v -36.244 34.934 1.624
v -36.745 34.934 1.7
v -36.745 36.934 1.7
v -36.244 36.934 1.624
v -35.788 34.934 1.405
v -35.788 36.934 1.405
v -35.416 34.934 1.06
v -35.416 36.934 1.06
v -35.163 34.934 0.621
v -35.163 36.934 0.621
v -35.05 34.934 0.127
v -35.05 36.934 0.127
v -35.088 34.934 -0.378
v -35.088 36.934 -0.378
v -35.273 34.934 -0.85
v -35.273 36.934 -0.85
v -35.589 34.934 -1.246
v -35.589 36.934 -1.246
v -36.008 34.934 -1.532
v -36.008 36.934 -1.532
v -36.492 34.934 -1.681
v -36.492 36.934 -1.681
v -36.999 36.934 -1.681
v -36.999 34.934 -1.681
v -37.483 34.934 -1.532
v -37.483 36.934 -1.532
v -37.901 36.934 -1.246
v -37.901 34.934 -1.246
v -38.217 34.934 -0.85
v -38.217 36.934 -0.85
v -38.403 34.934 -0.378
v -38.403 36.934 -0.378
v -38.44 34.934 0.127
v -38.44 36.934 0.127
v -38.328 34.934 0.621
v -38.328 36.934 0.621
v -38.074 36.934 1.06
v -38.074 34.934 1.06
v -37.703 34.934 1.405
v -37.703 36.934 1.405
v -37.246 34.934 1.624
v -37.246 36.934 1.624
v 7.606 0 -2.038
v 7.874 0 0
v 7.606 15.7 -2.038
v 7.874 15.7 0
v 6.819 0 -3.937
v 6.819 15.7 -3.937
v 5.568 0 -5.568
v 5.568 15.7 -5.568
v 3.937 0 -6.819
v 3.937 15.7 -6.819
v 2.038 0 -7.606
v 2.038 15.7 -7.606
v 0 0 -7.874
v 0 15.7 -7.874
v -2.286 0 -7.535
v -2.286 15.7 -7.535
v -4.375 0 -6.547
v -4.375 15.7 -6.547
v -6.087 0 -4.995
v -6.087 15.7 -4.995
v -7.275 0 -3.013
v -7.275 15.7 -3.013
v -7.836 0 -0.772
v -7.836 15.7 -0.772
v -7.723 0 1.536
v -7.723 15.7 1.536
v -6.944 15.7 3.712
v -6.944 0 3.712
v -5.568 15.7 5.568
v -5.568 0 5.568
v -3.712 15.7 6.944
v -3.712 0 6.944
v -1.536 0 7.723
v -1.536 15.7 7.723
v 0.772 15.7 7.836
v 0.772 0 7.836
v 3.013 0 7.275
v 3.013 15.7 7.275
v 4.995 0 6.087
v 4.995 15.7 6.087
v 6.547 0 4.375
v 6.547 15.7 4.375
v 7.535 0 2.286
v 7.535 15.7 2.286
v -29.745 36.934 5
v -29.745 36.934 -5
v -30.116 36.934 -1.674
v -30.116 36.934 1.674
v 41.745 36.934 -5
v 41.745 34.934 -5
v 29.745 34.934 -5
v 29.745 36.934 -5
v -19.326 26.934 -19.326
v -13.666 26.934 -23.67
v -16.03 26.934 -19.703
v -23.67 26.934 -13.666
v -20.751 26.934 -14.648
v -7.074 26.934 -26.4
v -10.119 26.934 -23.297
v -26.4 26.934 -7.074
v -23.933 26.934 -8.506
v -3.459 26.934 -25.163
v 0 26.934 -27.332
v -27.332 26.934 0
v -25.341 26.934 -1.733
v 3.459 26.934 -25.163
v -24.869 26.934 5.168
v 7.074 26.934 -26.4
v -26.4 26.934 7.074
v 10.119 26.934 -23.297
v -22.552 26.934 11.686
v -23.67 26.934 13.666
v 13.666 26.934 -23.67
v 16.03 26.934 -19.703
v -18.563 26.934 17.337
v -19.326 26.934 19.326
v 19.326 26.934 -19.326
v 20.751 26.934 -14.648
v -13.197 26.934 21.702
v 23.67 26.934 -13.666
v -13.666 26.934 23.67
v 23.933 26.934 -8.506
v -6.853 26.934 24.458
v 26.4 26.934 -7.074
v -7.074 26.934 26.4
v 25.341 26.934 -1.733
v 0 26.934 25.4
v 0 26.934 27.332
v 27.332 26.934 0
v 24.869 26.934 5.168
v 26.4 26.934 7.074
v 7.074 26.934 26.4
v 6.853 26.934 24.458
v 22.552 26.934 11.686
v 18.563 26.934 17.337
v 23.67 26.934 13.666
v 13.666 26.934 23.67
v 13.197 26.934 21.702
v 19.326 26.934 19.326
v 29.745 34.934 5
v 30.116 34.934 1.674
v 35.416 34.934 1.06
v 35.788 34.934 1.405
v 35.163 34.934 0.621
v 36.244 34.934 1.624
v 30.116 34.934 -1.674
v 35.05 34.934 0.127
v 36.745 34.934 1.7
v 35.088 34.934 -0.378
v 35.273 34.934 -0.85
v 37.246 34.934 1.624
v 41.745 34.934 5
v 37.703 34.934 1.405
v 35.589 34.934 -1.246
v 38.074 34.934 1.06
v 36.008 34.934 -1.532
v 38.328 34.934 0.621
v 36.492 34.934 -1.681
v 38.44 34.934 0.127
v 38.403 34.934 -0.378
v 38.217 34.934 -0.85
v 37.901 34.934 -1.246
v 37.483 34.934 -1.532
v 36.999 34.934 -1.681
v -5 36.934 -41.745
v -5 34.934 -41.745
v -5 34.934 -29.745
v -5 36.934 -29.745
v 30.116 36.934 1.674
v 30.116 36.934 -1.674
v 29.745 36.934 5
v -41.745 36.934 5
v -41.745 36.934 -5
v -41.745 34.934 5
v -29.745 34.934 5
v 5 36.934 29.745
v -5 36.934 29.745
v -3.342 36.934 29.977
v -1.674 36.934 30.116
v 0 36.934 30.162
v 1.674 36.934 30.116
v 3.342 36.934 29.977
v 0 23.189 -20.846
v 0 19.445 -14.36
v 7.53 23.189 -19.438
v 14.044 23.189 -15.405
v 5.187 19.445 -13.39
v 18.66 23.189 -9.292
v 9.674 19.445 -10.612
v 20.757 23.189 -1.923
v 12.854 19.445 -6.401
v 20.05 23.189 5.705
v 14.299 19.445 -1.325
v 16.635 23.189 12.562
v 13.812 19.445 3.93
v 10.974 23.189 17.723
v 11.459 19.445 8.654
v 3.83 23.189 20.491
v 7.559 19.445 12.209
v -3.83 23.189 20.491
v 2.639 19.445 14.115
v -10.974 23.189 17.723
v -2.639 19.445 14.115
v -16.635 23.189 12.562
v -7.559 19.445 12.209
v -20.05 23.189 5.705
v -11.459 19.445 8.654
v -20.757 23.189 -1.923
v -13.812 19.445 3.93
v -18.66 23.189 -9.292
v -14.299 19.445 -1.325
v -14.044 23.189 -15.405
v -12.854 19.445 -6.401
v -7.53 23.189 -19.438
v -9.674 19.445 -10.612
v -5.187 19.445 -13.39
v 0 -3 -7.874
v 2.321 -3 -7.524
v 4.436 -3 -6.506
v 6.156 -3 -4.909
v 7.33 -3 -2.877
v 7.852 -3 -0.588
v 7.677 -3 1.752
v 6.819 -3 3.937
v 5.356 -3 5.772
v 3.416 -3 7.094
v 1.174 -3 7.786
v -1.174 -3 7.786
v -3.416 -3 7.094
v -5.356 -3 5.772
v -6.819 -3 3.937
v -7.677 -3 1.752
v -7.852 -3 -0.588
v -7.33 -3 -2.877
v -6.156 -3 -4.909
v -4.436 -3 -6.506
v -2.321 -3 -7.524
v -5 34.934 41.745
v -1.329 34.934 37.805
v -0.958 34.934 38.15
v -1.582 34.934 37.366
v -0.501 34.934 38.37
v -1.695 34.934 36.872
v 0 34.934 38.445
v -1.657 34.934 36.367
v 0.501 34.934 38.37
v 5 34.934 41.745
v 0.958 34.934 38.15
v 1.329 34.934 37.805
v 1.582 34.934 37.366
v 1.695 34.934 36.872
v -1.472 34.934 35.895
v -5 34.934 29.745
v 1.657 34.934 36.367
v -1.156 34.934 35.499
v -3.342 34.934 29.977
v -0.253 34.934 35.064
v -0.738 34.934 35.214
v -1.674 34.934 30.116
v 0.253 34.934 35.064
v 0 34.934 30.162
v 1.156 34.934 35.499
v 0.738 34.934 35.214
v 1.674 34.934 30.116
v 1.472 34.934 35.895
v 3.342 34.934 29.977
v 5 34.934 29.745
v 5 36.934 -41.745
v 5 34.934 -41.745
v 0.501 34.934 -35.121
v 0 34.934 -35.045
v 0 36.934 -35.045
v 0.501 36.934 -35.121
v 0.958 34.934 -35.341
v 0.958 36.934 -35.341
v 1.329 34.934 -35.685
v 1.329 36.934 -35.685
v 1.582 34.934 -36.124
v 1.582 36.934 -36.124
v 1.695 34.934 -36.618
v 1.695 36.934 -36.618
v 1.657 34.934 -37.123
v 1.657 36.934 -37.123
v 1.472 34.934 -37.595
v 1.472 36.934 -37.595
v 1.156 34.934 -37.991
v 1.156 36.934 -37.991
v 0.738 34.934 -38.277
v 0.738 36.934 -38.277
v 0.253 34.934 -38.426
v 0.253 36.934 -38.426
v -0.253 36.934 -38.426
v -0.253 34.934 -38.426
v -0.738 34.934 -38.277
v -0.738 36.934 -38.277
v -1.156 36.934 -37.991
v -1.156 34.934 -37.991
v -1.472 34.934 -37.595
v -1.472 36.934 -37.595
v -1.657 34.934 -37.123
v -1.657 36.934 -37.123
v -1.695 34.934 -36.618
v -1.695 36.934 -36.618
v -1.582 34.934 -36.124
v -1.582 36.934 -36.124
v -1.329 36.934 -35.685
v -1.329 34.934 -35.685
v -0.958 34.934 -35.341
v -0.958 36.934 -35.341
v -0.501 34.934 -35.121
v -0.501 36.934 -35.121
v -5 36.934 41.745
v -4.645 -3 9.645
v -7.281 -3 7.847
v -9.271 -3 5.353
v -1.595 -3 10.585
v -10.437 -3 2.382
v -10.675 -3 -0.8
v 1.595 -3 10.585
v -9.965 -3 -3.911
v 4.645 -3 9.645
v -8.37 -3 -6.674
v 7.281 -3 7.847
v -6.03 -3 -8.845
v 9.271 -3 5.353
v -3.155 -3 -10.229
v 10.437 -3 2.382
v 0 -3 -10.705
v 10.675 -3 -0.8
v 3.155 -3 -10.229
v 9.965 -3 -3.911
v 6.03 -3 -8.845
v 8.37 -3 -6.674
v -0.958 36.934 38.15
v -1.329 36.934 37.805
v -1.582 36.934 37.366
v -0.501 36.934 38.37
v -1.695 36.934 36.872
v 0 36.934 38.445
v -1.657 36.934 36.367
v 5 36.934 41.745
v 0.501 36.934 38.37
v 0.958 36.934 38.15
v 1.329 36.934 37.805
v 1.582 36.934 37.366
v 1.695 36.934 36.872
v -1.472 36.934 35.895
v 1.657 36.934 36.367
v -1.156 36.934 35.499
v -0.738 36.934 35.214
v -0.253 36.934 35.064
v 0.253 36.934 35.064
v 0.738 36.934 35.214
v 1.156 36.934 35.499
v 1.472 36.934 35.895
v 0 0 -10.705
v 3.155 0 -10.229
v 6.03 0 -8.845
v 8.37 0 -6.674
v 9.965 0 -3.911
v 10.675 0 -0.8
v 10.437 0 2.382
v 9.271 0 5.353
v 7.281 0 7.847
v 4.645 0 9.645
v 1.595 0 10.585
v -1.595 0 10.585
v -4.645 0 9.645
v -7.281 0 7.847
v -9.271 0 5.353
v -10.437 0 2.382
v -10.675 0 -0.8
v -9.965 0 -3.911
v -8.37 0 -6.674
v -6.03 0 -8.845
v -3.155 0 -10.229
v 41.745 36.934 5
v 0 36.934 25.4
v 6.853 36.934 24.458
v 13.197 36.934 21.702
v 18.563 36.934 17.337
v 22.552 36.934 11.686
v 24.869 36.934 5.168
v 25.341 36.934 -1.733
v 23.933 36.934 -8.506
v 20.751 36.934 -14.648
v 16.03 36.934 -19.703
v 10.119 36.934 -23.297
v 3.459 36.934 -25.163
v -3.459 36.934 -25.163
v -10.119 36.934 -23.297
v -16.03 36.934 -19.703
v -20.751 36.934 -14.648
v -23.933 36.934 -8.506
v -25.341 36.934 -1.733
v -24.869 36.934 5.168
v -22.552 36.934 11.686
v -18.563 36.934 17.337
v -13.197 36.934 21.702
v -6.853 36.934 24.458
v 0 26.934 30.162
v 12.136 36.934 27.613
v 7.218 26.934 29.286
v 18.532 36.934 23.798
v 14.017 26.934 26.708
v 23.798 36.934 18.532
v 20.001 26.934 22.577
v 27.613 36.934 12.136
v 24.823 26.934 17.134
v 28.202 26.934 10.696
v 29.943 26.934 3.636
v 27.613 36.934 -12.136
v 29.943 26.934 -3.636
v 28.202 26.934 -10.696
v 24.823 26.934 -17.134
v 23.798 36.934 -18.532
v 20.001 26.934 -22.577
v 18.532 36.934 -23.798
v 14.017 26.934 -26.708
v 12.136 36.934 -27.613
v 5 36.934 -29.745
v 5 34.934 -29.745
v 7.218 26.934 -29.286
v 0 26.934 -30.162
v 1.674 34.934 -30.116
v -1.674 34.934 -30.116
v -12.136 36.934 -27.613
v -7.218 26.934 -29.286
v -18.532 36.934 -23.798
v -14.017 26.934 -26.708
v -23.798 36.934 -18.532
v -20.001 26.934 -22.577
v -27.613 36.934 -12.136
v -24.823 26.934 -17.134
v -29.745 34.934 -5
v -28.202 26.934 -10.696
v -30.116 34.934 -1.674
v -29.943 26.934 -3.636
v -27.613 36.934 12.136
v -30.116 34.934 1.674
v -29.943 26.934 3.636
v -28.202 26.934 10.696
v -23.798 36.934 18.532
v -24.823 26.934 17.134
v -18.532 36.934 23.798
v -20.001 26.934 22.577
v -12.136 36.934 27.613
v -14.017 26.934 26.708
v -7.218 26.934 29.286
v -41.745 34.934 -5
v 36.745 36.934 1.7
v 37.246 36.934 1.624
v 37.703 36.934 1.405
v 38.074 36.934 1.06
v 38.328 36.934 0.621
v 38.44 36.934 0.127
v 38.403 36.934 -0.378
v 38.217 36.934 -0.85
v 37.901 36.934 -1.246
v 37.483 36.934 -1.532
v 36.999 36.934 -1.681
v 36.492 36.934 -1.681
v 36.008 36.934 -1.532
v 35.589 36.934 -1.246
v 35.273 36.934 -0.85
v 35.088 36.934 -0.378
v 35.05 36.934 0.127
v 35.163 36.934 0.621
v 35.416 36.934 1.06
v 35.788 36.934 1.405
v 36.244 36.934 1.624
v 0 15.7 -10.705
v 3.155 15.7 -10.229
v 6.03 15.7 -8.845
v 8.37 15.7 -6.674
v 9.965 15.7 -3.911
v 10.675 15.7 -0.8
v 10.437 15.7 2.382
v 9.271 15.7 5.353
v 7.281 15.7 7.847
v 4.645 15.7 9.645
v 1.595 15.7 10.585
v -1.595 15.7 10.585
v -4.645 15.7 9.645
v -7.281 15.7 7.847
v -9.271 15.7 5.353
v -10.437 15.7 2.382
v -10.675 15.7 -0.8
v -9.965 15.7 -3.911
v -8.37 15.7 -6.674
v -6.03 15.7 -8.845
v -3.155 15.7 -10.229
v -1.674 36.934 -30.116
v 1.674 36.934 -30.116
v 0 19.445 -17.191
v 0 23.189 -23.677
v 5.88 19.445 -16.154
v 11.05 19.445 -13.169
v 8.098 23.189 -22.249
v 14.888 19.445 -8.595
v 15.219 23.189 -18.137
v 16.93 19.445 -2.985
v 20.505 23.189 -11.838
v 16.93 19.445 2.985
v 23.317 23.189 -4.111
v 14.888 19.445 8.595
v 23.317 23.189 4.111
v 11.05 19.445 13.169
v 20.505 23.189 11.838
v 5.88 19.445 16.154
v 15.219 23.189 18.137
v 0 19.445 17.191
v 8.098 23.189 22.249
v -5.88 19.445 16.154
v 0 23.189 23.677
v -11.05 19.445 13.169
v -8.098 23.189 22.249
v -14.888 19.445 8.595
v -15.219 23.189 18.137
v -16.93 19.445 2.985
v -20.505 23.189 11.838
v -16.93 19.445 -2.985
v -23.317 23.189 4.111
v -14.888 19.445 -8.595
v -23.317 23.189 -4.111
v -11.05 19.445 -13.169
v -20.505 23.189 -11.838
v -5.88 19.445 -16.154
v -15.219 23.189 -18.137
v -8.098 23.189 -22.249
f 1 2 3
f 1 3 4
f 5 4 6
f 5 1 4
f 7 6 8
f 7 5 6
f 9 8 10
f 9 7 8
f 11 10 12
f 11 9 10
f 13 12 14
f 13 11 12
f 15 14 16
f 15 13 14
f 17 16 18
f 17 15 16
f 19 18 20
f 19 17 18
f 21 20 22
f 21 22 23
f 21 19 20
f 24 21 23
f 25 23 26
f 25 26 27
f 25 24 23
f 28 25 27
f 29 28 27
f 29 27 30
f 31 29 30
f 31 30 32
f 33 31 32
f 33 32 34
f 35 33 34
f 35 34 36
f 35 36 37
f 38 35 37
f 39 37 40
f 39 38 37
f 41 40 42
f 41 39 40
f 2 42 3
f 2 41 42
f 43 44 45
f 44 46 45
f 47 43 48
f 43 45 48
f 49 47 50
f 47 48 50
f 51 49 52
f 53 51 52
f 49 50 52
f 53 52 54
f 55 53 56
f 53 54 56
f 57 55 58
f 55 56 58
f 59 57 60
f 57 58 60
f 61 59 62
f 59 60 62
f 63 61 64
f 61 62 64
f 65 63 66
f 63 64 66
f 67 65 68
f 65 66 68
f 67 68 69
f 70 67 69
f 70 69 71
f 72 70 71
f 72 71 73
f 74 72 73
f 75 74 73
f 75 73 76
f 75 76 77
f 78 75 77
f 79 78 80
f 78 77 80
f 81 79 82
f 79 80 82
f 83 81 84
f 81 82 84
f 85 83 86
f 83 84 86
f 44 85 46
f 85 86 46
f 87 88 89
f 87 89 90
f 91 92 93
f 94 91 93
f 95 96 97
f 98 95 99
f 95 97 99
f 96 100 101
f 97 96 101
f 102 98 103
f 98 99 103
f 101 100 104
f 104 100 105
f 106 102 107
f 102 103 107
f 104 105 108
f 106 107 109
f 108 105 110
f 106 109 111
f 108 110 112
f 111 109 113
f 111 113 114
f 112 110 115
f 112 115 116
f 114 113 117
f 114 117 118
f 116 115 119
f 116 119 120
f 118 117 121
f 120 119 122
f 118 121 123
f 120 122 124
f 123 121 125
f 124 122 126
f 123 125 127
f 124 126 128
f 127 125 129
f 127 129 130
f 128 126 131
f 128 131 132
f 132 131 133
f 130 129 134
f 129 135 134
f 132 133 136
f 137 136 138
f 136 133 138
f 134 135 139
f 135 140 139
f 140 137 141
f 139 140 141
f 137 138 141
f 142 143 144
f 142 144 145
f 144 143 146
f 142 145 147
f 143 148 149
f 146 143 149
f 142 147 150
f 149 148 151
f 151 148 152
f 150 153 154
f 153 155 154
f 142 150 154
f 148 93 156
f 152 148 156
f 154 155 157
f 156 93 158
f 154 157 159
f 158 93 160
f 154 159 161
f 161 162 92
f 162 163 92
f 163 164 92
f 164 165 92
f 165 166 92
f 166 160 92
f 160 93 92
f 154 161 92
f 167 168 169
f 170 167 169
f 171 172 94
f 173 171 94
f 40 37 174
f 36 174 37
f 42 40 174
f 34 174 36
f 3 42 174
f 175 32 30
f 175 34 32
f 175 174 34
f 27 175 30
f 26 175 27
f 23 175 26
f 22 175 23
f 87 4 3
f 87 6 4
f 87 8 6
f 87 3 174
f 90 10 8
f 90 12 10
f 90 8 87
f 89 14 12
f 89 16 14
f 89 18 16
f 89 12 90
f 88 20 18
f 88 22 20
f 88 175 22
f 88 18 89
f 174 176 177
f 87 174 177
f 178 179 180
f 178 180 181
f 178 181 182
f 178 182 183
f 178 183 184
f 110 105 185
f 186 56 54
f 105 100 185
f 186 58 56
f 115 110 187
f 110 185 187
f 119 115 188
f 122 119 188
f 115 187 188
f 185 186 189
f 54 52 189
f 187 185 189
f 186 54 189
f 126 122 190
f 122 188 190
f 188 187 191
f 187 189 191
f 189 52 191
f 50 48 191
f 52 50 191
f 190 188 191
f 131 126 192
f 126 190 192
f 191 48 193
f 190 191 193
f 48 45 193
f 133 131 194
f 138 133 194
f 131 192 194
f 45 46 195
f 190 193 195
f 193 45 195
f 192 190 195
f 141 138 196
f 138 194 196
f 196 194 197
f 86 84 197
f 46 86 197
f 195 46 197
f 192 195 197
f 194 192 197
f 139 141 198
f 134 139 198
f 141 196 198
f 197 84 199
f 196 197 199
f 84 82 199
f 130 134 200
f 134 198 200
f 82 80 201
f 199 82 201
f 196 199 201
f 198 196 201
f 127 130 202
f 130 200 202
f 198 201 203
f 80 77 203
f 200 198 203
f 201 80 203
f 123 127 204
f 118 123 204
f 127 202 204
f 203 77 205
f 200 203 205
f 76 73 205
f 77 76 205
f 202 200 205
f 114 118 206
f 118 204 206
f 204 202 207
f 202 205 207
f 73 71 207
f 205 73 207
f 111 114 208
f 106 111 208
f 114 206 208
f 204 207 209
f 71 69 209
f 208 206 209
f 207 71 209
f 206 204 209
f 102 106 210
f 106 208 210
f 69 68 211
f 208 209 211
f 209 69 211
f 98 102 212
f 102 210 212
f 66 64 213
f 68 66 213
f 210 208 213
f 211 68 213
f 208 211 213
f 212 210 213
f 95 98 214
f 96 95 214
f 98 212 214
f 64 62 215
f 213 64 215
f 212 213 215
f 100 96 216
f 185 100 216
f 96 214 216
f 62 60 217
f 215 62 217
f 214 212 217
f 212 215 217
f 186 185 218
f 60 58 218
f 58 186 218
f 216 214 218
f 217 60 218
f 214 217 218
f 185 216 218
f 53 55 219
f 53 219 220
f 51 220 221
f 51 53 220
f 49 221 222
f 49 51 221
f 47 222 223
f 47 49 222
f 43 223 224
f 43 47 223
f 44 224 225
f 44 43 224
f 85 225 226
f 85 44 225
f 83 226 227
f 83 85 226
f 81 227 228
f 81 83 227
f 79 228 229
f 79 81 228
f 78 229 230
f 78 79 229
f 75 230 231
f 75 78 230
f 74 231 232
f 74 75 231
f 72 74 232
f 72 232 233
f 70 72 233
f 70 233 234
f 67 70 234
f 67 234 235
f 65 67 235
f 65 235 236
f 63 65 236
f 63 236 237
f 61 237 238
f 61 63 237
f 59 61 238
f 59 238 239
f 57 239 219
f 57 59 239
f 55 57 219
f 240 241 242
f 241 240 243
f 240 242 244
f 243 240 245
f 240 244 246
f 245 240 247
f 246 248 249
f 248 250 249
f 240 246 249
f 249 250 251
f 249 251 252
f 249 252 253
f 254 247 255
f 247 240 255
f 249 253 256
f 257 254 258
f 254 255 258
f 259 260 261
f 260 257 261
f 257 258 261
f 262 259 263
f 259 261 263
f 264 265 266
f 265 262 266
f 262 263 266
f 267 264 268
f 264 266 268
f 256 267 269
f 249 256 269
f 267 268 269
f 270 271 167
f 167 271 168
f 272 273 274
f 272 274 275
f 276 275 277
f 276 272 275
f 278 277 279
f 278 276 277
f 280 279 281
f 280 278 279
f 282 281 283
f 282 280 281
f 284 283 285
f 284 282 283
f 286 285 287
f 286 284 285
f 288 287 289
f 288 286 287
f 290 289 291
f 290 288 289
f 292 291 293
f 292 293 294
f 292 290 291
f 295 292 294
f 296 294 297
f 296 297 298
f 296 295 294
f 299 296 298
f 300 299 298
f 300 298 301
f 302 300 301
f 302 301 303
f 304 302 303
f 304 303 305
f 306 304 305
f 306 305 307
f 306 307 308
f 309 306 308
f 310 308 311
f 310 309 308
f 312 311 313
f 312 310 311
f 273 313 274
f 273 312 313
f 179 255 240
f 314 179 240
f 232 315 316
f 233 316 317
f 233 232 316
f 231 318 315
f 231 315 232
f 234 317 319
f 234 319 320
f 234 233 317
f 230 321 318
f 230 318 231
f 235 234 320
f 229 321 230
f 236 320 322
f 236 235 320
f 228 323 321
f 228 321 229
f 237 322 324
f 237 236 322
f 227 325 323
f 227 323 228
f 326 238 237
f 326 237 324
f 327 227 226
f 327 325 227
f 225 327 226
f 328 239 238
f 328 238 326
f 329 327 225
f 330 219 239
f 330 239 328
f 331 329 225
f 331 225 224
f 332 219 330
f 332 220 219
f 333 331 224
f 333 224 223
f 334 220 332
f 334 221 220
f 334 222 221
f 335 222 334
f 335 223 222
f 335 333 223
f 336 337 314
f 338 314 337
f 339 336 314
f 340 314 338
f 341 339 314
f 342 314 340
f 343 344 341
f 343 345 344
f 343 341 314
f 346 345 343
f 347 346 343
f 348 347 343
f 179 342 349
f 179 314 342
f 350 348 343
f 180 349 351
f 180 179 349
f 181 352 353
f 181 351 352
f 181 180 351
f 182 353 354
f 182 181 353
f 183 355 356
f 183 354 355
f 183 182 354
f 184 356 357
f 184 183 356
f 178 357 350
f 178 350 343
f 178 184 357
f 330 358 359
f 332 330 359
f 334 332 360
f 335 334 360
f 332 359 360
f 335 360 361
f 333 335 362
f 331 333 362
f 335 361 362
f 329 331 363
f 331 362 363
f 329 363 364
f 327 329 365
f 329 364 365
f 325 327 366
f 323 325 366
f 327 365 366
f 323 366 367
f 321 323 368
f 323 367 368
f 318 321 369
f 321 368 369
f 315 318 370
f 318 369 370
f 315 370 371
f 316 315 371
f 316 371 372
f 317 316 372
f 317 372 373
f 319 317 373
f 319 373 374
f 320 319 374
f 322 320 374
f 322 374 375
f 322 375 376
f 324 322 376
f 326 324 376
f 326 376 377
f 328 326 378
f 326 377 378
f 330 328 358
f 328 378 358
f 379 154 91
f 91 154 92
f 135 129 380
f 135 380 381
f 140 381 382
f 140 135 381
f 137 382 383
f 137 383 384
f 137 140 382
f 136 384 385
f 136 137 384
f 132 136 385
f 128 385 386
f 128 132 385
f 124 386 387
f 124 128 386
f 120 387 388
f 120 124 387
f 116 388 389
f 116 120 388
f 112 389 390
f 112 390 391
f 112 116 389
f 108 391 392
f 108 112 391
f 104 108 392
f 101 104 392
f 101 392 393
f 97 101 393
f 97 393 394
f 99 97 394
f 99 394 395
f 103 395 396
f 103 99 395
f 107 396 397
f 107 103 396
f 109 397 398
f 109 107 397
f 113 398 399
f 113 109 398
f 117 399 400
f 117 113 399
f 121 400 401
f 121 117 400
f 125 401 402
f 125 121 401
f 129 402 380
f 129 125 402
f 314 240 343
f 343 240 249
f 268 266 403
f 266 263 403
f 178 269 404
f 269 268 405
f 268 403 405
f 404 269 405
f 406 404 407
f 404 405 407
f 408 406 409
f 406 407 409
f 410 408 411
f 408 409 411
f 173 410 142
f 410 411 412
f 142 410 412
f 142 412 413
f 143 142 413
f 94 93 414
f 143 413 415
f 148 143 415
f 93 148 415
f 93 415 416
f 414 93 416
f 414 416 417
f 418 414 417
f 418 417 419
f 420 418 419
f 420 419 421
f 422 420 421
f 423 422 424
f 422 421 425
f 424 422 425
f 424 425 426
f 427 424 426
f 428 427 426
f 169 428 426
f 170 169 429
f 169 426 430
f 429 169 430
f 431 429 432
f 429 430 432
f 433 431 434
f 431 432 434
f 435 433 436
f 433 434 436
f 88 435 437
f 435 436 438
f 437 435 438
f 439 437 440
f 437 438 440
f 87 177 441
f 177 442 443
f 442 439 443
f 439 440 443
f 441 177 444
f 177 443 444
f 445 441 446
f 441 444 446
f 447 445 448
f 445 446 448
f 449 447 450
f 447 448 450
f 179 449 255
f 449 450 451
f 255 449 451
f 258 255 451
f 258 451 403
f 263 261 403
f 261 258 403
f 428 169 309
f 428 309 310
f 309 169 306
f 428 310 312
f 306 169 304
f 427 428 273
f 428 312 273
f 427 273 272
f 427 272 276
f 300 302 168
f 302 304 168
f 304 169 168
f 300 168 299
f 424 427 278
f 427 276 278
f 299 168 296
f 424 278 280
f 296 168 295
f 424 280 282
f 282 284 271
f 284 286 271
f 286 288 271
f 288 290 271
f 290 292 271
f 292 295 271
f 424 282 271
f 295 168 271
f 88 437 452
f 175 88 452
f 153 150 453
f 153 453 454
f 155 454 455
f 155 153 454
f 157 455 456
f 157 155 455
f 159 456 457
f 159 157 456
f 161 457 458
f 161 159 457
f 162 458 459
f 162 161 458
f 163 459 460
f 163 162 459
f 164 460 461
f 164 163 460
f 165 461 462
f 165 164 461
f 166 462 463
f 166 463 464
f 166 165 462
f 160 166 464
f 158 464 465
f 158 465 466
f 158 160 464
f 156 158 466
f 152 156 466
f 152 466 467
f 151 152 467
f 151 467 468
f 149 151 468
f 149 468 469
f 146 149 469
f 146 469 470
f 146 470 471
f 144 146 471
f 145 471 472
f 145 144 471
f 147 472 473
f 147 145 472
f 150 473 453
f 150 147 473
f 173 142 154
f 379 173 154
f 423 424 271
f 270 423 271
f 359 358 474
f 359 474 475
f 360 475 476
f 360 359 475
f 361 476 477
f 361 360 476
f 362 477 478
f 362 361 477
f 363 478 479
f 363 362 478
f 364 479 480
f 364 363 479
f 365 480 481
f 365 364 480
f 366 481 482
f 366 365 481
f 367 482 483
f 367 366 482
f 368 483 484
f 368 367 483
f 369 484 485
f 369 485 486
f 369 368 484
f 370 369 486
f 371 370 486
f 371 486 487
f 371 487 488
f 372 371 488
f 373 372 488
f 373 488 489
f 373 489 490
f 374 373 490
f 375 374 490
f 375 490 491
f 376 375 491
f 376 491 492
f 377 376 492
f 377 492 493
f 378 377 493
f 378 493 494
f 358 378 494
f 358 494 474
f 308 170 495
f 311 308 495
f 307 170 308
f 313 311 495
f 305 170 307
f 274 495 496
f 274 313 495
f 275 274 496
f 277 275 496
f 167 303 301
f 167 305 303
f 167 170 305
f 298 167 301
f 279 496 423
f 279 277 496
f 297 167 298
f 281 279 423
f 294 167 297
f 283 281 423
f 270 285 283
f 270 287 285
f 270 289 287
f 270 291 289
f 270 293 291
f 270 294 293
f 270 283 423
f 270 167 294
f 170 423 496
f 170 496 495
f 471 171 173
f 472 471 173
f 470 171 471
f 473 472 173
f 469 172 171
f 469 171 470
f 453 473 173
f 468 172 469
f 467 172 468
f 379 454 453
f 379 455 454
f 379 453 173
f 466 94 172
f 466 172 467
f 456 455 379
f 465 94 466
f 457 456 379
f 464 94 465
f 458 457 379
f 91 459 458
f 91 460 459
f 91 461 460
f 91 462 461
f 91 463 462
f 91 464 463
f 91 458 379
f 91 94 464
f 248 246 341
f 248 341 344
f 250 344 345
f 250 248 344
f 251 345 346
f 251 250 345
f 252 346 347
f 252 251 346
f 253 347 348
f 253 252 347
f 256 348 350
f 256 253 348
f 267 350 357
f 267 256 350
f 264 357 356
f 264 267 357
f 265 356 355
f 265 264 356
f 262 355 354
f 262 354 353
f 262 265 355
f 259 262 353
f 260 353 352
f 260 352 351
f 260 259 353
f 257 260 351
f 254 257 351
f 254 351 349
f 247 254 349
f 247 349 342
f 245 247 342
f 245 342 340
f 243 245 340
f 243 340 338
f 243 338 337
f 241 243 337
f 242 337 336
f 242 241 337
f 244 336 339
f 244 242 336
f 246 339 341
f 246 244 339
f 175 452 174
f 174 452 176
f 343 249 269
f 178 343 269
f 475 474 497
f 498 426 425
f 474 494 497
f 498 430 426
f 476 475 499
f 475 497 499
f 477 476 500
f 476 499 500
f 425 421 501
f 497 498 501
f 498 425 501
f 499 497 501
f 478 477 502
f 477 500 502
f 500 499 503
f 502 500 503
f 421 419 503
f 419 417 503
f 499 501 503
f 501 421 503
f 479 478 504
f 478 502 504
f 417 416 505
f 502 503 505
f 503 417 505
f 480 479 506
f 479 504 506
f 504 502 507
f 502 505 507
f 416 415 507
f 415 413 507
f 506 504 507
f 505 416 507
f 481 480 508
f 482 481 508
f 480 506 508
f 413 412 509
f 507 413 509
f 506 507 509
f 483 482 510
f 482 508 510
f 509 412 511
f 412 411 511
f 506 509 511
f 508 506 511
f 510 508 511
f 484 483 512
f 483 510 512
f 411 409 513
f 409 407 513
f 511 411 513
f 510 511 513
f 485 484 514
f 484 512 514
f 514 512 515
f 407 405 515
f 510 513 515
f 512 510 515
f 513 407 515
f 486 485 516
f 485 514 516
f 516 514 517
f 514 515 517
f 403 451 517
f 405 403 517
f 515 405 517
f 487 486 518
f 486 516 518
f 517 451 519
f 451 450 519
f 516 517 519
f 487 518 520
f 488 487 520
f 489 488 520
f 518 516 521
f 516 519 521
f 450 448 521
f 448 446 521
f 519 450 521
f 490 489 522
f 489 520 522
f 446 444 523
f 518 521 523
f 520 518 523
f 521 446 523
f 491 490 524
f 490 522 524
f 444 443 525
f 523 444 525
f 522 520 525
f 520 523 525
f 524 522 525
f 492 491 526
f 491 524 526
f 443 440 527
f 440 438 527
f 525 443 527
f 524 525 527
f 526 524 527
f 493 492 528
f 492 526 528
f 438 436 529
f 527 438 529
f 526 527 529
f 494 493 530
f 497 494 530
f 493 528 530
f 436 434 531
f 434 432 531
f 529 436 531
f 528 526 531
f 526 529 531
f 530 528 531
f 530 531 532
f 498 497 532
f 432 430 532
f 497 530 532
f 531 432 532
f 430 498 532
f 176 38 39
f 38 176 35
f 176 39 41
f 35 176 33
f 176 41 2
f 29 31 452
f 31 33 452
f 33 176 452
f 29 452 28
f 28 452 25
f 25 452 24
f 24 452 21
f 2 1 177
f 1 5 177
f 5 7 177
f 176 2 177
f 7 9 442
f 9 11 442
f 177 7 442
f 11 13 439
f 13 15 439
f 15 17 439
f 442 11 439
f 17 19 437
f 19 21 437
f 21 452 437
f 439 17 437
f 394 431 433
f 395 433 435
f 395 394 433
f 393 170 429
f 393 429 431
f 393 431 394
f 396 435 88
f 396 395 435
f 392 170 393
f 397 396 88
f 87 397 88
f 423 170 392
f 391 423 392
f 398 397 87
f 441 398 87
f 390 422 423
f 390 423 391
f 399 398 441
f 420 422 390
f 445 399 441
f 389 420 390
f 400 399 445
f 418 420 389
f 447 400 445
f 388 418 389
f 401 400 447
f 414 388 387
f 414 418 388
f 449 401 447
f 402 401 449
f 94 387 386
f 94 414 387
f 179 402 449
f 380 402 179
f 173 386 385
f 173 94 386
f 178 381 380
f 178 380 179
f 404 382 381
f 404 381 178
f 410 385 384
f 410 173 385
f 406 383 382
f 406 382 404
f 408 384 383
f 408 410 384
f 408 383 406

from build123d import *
from build123d.topology import SkipClean

# Parameters (mm, degrees)
SKETCH5_OUTSIDE_W   = 34.468
SKETCH5_OUTSIDE_H   = 34.468
CUT_EXTRUDE1_DEPTH  = 7.2
BOSS_EXTRUDE1_REACH = 51.718
SKETCH10_R          = 10.705
SKETCH10_R_2        = 6.9
SKETCH22_R          = 10.705
SKETCH22_R_2        = 7.874
BOSS_EXTRUDE7_DEPTH = 3
BOSS_EXTRUDE3_REACH = 31.655
SKETCH12_R          = 8.3
CUT_EXTRUDE3_REACH  = 56.551
SKETCH13_R          = 3.45
SKETCH14_R          = 23.979548074
CUT_EXTRUDE5_DEPTH  = 32
SKETCH17_R          = 30.1625
SKETCH17_R_2        = 25.4
BOSS_EXTRUDE5_DEPTH = 10
BOSS_EXTRUDE6_START = -2
SKETCH18_R          = 1.7
BOSS_EXTRUDE6_DEPTH = 2


# Read off the part's stored shape, not the designer's step: Cut-Extrude2
with BuildPart() as part:
    # Sketch1 → Revolve1 (revolve)
    with BuildSketch(Plane.XY, mode=Mode.PRIVATE) as revolve1_sk:
        Polygon((3.25, 47.7), (4.8, 47.7), (5.2, 43.217813034), (4.8, 42.533333333), (5.2, 38.051146367), (4.8, 37.366666667), (5.2, 32.8844797), (4.8, 32.2), (5.25, 26.2), (5.25, 22.2), (10.6, 22.2), (10.6, 15), (8.3, 15), (8.3, 0), (5.5, 0), (5.5, 18), (3.25, 19.7), align=None)
    revolve(revolve1_sk.sketch.rotate(Axis((0, 0, 0), (0, 1, 0)), 90), axis=Axis((0, 0, 0), (0, 1, 0)))

    # Sketch5 outside → Cut-Extrude1 (cut)
    with BuildSketch(Plane(origin=(0, 22.2, 0), x_dir=(1, 0, 0), z_dir=(0, 1, 0))):
        Rectangle(SKETCH5_OUTSIDE_W, SKETCH5_OUTSIDE_H)
        Polygon((-5.3, 9.17986928), (5.3, 9.17986928), (10.6, 0), (5.3, -9.17986928), (-5.3, -9.17986928), (-10.6, 0), align=None, mode=Mode.SUBTRACT)
    extrude(amount=-CUT_EXTRUDE1_DEPTH, mode=Mode.SUBTRACT)

    # Sketch4 → Cut-Revolve1 (revolve, cut)
    with BuildSketch(Plane.XY, mode=Mode.PRIVATE) as cut_revolve1_sk:
        Polygon((6.9, 0), (8.3, 1.4), (8.3, 0), align=None)
        Polygon((8.3, 15), (10.6, 15.837131539), (10.6, 15), align=None)
        Polygon((8.3, 22.2), (10.6, 21.362868461), (10.6, 22.2), align=None)
    revolve(cut_revolve1_sk.sketch.rotate(Axis((0, 0, 0), (0, 1, 0)), 90), axis=Axis((0, 0, 0), (0, 1, 0)), mode=Mode.SUBTRACT)

    # Boss-Extrude1: up to this cone (the profile starts outside it)
    boss_extrude1_end = Plane(origin=(0, 0, 0), z_dir=(0, 1, 0)).offset(11.979048056) * Cone(2.747e-06, 110.555614597, 40.238951944, align=(Align.CENTER, Align.CENTER, Align.MIN), mode=Mode.PRIVATE)
    # Sketch10 → Boss-Extrude1 (add, up to the surface)
    with BuildSketch(Plane.XZ, mode=Mode.PRIVATE) as boss_extrude1_sk1:
        with Locations(Location((0, 0, 0), (0, 0, 270))):
            Circle(SKETCH10_R)
        Circle(SKETCH10_R_2, mode=Mode.SUBTRACT)
    boss_extrude1_tool1 = extrude(boss_extrude1_sk1.sketch, amount=-BOSS_EXTRUDE1_REACH, mode=Mode.PRIVATE) - boss_extrude1_end
    add(boss_extrude1_tool1.solids().sort_by_distance((0, 0, 10.402217))[0])

    # Cut-Extrude2 outline → Cut-Extrude2 (revolve, cut)
    with BuildSketch(Plane.XY):
        Polygon((7.874, 16.206311111), (5.5, 18), (5.5, 0), (7.874, 0), align=None)
    revolve(axis=Axis((0, 0, 0), (0, 1, 0)), mode=Mode.SUBTRACT)

    # Sketch22 → Boss-Extrude7 (add)
    with SkipClean():  # the faces are left unmerged after this step: merging them gives an invalid solid
        with BuildSketch(Plane.XZ):
            with Locations(Location((0, 0, 0), (0, 0, 270))):
                Circle(SKETCH22_R)
            with Locations(Location((0, 0, 0), (0, 0, 270))):
                Circle(SKETCH22_R_2, mode=Mode.SUBTRACT)
        extrude(amount=BOSS_EXTRUDE7_DEPTH)

    # Boss-Extrude3: up to this cone (the profile starts inside it)
    with SkipClean():  # the faces are left unmerged after this step: merging them gives an invalid solid
        boss_extrude3_end = Plane(origin=(0, 22.2, 0), z_dir=(0, 1, 0)).offset(-10.220951944) * Cone(2.747e-06, 193.581188051, 70.457789364, align=(Align.CENTER, Align.CENTER, Align.MIN), mode=Mode.PRIVATE)
        # Sketch12 → Boss-Extrude3 (add, up to the surface)
        with BuildSketch(Plane(origin=(0, 22.2, 0), x_dir=(1, 0, 0), z_dir=(0, 1, 0)), mode=Mode.PRIVATE) as boss_extrude3_sk1:
            Polygon((-7.609401077, 13.17986928), (-15.218802154, 0), (-7.609401077, -13.17986928), (7.609401077, -13.17986928), (15.218802154, 0), (7.609401077, 13.17986928), align=None)
            Circle(SKETCH12_R, mode=Mode.SUBTRACT)
        boss_extrude3_tool1 = extrude(boss_extrude3_sk1.sketch, amount=-BOSS_EXTRUDE3_REACH, mode=Mode.PRIVATE) & boss_extrude3_end
        add(boss_extrude3_tool1.solids().sort_by_distance((-11.065395, 22.2, -6.388609))[0])

    # Cut-Extrude3: up to this cone (the profile starts outside it)
    with SkipClean():  # the faces are left unmerged after this step: merging them gives an invalid solid
        cut_extrude3_end = Plane(origin=(0, 47.7, 0), z_dir=(0, -1, 0)).offset(25.544445444) * Cone(1.324e-06, 41.699852941, 31.506554556, align=(Align.CENTER, Align.CENTER, Align.MIN), mode=Mode.PRIVATE)
        # Sketch13 → Cut-Extrude3 (cut, up to the surface)
        with BuildSketch(Plane(origin=(0, 47.7, 0), x_dir=(1, 0, 0), z_dir=(0, 1, 0)), mode=Mode.PRIVATE) as cut_extrude3_sk1:
            with Locations(Location((0, 0, 0), (0, 0, 270))):
                Circle(SKETCH13_R)
        cut_extrude3_tool1 = extrude(cut_extrude3_sk1.sketch, amount=-CUT_EXTRUDE3_REACH, mode=Mode.PRIVATE) - cut_extrude3_end
        add(cut_extrude3_tool1.solids().sort_by_distance((0, 47.7, 0))[0], mode=Mode.SUBTRACT)

    # Sketch14 → Cut-Extrude5 (cut)
    with SkipClean():  # the faces are left unmerged after this step: merging them gives an invalid solid
        with BuildSketch(Plane(origin=(0, 47.7, 0), x_dir=(1, 0, 0), z_dir=(0, 1, 0))):
            Circle(SKETCH14_R)
        extrude(amount=-CUT_EXTRUDE5_DEPTH, mode=Mode.SUBTRACT)

    # Sketch20 → Revolve2 (revolve)
    with SkipClean():  # the faces are left unmerged after this step: merging them gives an invalid solid
        with BuildSketch(Plane(origin=(0, 0, 0), x_dir=(0, 0, -1), z_dir=(1, 0, 0))):
            Polygon((10.705, 15.7), (30.1625, 26.933792863), (27.3315, 26.933792863), (7.874, 15.7), align=None)
        revolve(axis=Axis((0, 30.70199832, 0), (0, -1, 0)))

    # Sketch17 → Boss-Extrude5 (add)
    with SkipClean():  # the faces are left unmerged after this step: merging them gives an invalid solid
        with BuildSketch(Plane(origin=(0, 26.933792863, 0), x_dir=(1, 0, 0), z_dir=(0, 1, 0))):
            with Locations(Location((0, 0, 0), (0, 0, 270))):
                Circle(SKETCH17_R)
            with Locations(Location((0, 0, 0), (0, 0, 270))):
                Circle(SKETCH17_R_2, mode=Mode.SUBTRACT)
        extrude(amount=BOSS_EXTRUDE5_DEPTH)

    # Sketch18 → Boss-Extrude6 (add)
    # profile 1 of 8: a face of its own
    with SkipClean():  # the faces are left unmerged after this step: merging them gives an invalid solid
        with BuildSketch(Plane(origin=(0, 36.933792863, 0), x_dir=(1, 0, 0), z_dir=(0, 1, 0)).offset(BOSS_EXTRUDE6_START)):
            with BuildLine():
                ThreePointArc((-29.745191313, -5), (-30.1625, 0), (-29.745191313, 5))
                Line((-29.745191313, 5), (-41.745191313, 5))
                Line((-41.745191313, 5), (-41.745191313, -5))
                Line((-41.745191313, -5), (-29.745191313, -5))
            make_face()
            with Locations(Location((-36.745191313, 0, 0), (0, 0, 270))):
                Circle(SKETCH18_R, mode=Mode.SUBTRACT)
        # profile 2 of 8: a face of its own
        with BuildSketch(Plane(origin=(0, 36.933792863, 0), x_dir=(1, 0, 0), z_dir=(0, 1, 0)).offset(BOSS_EXTRUDE6_START)):
            with BuildLine():
                Line((-29.745191313, -5), (-29.745191313, 5))
                ThreePointArc((-29.745191313, 5), (-30.1625, 0), (-29.745191313, -5))
            make_face()
        # profile 3 of 8: a face of its own
        with BuildSketch(Plane(origin=(0, 36.933792863, 0), x_dir=(1, 0, 0), z_dir=(0, 1, 0)).offset(BOSS_EXTRUDE6_START)):
            with BuildLine():
                ThreePointArc((29.745191313, -5), (30.1625, 0), (29.745191313, 5))
                Line((29.745191313, 5), (29.745191313, -5))
            make_face()
        # profile 4 of 8: a face of its own
        with BuildSketch(Plane(origin=(0, 36.933792863, 0), x_dir=(1, 0, 0), z_dir=(0, 1, 0)).offset(BOSS_EXTRUDE6_START)):
            with BuildLine():
                Line((41.745191313, 5), (29.745191313, 5))
                ThreePointArc((29.745191313, 5), (30.1625, 0), (29.745191313, -5))
                Line((29.745191313, -5), (41.745191313, -5))
                Line((41.745191313, -5), (41.745191313, 5))
            make_face()
            with Locations(Location((36.745191313, 0, 0), (0, 0, 270))):
                Circle(SKETCH18_R, mode=Mode.SUBTRACT)
        # profile 5 of 8: a face of its own
        with BuildSketch(Plane(origin=(0, 36.933792863, 0), x_dir=(1, 0, 0), z_dir=(0, 1, 0)).offset(BOSS_EXTRUDE6_START)):
            with BuildLine():
                ThreePointArc((5, -29.745191313), (0, -30.1625), (-5, -29.745191313))
                Line((-5, -29.745191313), (-5, -41.745191313))
                Line((-5, -41.745191313), (5, -41.745191313))
                Line((5, -41.745191313), (5, -29.745191313))
            make_face()
            with Locations(Location((0, -36.745191313, 0), (0, 0, 270))):
                Circle(SKETCH18_R, mode=Mode.SUBTRACT)
        # profile 6 of 8: a face of its own
        with BuildSketch(Plane(origin=(0, 36.933792863, 0), x_dir=(1, 0, 0), z_dir=(0, 1, 0)).offset(BOSS_EXTRUDE6_START)):
            with BuildLine():
                Line((5, -29.745191313), (-5, -29.745191313))
                ThreePointArc((-5, -29.745191313), (0, -30.1625), (5, -29.745191313))
            make_face()
        # profile 7 of 8: a face of its own
        with BuildSketch(Plane(origin=(0, 36.933792863, 0), x_dir=(1, 0, 0), z_dir=(0, 1, 0)).offset(BOSS_EXTRUDE6_START)):
            with BuildLine():
                ThreePointArc((5, 29.745191313), (0, 30.1625), (-5, 29.745191313))
                Line((-5, 29.745191313), (5, 29.745191313))
            make_face()
        # profile 8 of 8: a face of its own
        with BuildSketch(Plane(origin=(0, 36.933792863, 0), x_dir=(1, 0, 0), z_dir=(0, 1, 0)).offset(BOSS_EXTRUDE6_START)):
            with BuildLine():
                Line((-5, 41.745191313), (-5, 29.745191313))
                ThreePointArc((-5, 29.745191313), (0, 30.1625), (5, 29.745191313))
                Line((5, 29.745191313), (5, 41.745191313))
                Line((5, 41.745191313), (-5, 41.745191313))
            make_face()
            with Locations(Location((0, 36.745191313, 0), (0, 0, 270))):
                Circle(SKETCH18_R, mode=Mode.SUBTRACT)
        extrude(amount=BOSS_EXTRUDE6_DEPTH)


solid = part.part
